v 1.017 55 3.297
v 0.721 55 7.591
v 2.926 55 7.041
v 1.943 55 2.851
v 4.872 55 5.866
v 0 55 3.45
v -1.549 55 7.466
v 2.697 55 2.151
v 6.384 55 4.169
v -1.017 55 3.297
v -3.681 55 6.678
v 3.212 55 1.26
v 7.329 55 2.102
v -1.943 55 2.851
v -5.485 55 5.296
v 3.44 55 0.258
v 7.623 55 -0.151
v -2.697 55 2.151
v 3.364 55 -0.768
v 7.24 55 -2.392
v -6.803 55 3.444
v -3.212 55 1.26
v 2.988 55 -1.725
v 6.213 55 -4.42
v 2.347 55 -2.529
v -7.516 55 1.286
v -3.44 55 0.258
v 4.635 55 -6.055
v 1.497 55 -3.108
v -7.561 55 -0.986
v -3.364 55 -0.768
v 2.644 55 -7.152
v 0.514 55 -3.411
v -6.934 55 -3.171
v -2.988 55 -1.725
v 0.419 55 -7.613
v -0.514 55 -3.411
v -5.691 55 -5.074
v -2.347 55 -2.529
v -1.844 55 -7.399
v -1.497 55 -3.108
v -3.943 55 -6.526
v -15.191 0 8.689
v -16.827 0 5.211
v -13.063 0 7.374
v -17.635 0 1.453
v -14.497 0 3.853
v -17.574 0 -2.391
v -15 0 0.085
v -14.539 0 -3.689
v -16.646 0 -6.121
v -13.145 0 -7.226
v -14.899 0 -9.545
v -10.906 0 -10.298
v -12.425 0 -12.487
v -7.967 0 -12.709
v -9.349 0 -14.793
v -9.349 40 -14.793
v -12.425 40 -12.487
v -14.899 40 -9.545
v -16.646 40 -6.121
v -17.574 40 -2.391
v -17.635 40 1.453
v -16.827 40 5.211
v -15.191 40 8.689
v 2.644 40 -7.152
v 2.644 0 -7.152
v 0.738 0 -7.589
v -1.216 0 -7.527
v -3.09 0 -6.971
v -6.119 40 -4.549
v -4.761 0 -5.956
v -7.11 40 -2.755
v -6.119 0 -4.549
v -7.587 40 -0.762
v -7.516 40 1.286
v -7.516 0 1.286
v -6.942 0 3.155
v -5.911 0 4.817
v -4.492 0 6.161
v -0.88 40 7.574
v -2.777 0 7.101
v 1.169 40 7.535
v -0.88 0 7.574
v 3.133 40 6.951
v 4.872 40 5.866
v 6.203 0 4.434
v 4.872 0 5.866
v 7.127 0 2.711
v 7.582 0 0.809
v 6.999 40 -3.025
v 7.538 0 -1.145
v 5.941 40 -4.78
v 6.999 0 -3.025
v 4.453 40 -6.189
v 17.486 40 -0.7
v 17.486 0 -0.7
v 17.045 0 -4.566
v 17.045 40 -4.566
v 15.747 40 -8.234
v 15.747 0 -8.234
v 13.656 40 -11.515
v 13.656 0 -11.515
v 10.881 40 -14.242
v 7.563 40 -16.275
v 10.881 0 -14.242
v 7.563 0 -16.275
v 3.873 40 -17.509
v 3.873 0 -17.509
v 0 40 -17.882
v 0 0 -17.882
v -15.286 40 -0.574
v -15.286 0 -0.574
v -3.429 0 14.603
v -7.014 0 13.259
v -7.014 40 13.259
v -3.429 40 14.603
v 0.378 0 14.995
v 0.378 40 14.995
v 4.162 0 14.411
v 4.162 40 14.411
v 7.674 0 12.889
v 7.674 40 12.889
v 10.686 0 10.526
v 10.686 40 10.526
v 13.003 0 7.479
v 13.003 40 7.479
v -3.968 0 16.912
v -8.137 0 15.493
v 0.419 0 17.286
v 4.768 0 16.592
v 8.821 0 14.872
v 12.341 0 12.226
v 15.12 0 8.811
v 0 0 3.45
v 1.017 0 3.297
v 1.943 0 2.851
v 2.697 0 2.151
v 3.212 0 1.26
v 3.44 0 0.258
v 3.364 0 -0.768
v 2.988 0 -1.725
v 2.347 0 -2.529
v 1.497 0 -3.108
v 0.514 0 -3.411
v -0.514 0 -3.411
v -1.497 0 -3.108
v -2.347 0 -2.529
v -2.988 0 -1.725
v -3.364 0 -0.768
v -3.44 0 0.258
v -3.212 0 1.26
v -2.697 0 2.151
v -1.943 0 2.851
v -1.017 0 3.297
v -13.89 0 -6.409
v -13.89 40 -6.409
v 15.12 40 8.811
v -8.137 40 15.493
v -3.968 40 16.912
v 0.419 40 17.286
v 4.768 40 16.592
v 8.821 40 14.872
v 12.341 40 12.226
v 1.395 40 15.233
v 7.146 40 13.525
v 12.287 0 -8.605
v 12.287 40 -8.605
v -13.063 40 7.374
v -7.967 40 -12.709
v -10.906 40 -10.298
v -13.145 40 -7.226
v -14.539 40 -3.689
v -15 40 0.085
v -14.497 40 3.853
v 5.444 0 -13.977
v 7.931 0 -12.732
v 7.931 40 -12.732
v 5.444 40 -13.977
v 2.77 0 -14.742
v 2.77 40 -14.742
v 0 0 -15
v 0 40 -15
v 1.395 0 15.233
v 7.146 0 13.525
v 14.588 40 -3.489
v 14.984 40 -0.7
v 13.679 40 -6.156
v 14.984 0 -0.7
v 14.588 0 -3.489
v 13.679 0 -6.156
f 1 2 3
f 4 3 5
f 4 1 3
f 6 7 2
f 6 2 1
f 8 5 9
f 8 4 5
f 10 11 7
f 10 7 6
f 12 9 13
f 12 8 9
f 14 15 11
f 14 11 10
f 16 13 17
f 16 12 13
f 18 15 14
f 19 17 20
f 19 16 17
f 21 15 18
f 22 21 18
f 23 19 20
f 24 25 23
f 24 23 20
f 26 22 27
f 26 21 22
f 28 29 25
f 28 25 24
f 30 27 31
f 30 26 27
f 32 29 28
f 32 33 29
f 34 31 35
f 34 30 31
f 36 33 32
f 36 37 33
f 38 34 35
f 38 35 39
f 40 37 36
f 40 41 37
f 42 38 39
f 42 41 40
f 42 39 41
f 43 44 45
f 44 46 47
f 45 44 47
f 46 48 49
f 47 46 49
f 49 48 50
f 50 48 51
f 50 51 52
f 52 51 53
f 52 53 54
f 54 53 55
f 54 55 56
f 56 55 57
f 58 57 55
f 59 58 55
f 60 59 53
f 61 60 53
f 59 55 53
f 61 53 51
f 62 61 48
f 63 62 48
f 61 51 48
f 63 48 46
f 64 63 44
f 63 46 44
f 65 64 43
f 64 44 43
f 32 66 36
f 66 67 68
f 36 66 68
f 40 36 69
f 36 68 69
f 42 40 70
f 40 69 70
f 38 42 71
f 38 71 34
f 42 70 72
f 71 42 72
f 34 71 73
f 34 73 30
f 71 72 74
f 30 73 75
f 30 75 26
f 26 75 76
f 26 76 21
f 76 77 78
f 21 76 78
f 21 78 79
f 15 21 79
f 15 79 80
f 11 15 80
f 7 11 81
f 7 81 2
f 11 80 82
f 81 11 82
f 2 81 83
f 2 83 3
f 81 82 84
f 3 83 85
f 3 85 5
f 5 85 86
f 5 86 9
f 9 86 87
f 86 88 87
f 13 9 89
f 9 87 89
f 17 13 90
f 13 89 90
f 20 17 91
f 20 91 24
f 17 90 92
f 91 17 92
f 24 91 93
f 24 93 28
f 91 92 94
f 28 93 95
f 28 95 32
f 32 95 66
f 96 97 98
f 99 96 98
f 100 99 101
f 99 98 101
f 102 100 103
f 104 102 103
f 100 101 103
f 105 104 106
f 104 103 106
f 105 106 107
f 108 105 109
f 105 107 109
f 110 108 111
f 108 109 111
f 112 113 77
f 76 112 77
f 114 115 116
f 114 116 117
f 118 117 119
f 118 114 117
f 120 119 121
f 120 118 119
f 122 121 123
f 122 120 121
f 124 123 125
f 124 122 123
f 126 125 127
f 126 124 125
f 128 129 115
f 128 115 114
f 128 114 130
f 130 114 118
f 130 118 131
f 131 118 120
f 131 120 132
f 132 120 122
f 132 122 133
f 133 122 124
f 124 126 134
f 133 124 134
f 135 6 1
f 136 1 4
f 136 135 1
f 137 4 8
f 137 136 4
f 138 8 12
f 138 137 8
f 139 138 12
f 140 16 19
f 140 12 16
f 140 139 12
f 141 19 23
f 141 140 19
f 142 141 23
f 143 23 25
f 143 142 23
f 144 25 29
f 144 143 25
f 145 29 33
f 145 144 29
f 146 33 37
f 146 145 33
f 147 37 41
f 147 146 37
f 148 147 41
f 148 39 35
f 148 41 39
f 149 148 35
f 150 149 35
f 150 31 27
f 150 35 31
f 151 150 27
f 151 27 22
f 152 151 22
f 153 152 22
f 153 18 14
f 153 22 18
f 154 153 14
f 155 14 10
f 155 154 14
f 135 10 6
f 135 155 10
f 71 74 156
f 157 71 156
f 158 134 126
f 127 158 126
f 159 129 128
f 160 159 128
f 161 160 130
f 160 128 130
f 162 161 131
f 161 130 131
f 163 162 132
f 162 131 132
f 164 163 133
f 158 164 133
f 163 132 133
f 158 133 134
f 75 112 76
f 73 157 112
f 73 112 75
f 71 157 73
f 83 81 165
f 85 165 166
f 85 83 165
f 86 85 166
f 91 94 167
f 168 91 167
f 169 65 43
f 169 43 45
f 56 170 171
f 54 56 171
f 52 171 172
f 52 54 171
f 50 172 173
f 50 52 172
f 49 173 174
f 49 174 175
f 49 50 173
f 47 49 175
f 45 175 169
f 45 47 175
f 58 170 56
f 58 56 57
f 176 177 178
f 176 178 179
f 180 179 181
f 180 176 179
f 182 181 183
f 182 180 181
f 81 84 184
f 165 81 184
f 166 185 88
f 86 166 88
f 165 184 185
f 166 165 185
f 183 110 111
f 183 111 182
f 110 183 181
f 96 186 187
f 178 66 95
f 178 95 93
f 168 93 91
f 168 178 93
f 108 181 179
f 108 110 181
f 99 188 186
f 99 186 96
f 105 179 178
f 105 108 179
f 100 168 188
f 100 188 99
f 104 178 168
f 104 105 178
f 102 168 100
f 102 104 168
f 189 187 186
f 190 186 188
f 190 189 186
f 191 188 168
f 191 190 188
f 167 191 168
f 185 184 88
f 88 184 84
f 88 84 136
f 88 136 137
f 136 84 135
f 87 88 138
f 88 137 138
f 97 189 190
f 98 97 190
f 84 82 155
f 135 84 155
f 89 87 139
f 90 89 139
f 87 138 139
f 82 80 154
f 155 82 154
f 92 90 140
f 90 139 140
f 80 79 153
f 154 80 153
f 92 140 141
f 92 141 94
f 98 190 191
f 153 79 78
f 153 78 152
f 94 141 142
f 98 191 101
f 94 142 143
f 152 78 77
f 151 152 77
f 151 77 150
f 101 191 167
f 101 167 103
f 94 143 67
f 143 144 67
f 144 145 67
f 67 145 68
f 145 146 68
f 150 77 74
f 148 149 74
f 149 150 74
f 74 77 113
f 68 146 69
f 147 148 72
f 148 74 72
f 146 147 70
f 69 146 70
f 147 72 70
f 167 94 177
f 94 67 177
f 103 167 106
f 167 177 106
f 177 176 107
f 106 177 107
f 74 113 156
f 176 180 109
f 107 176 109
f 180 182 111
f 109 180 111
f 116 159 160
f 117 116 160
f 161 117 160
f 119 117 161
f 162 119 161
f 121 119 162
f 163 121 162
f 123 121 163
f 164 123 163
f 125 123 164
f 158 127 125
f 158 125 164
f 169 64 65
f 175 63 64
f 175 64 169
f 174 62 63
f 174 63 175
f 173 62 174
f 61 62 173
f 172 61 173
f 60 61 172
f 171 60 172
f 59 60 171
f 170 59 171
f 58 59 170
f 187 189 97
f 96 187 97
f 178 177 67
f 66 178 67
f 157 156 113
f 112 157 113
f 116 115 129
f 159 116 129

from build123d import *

# Parameters (mm, degrees)
BOSS_EXTRUDE6_DEPTH   = 40
BOSS_EXTRUDE6_2_DEPTH = 40
BOSS_EXTRUDE6_3_DEPTH = 40
SKETCH12_R            = 15
CUT_EXTRUDE9_DEPTH    = 40
BOSS_EXTRUDE8_DEPTH   = 40
SKETCH18_R            = 7.625
BOSS_EXTRUDE9_DEPTH   = 55
SKETCH22_R            = 3.45
CUT_EXTRUDE13_DEPTH   = 61.487275479


with BuildPart() as part:
    # Sketch11 → Boss-Extrude6 (new body)
    with BuildSketch(Plane(origin=(0, 0, 0), x_dir=(1, 0, 0), z_dir=(0, 1, 0))):
        with BuildLine():
            ThreePointArc((-9.349413612, 14.793189822), (-17.216152438, 4.282475359), (-15.190534929, -8.688938287))
            Line((-15.190534929, -8.688938287), (0, 0.700234787))
            Line((0, 0.700234787), (-9.349413612, 14.793189822))
        make_face()
    extrude(amount=BOSS_EXTRUDE6_DEPTH)


with BuildPart() as body_2:
    # Sketch11 → Boss-Extrude6 2 (new body)
    with BuildSketch(Plane(origin=(0, 0, 0), x_dir=(1, 0, 0), z_dir=(0, 1, 0))):
        with BuildLine():
            Line((0, 17.881636961), (0, 0.700234787))
            Line((0, 0.700234787), (17.485984995, 0.700234787))
            ThreePointArc((17.485984995, 0.700234787), (12.345670366, 12.957480113), (0, 17.881636961))
        make_face()
    extrude(amount=BOSS_EXTRUDE6_2_DEPTH)


with BuildPart() as body_3:
    # Sketch11 → Boss-Extrude6 3 (new body)
    with BuildSketch(Plane(origin=(0, 0, 0), x_dir=(1, 0, 0), z_dir=(0, 1, 0))):
        with BuildLine():
            Line((15.120108753, -8.810920002), (0, 0.700234787))
            Line((0, 0.700234787), (-8.136571383, -15.49342461))
            ThreePointArc((-8.136571383, -15.49342461), (4.767573461, -16.592271542), (15.120108753, -8.810920002))
        make_face()
    extrude(amount=BOSS_EXTRUDE6_3_DEPTH)


with BuildPart() as cut_extrude9_tool:
    # Sketch12 → Cut-Extrude9 (new body)
    with BuildSketch(Plane(origin=(0, 0, 0), x_dir=(1, 0, 0), z_dir=(0, 1, 0))):
        Circle(SKETCH12_R)
    extrude(amount=CUT_EXTRUDE9_DEPTH)


with BuildPart() as part_1:
    add(part.part)

    # Cut-Extrude9: cut by cut_extrude9_tool
    add(cut_extrude9_tool.part, mode=Mode.SUBTRACT)


with BuildPart() as body_2_1:
    add(body_2.part)

    # Cut-Extrude9: cut by cut_extrude9_tool
    add(cut_extrude9_tool.part, mode=Mode.SUBTRACT)



with BuildPart() as body_3_1:
    add(body_3.part)

    # Cut-Extrude9: cut by cut_extrude9_tool
    add(cut_extrude9_tool.part, mode=Mode.SUBTRACT)


with BuildPart() as body_4:
    # Sketch17 → Boss-Extrude8 (new body)
    with BuildSketch(Plane(origin=(0, 0, 0), x_dir=(1, 0, 0), z_dir=(0, 1, 0))):
        Polygon((-15.286299289, 0.573632321), (-2.382731506, -2.514476202), (1.394671955, -15.233347962), (7.146369483, -13.525139675), (3.368966021, -0.806267914), (12.495130342, 8.824495324), (8.139929807, 12.951507354), (-0.986234515, 3.320744116), (-13.889802298, 6.408852638), align=None)
    extrude(amount=BOSS_EXTRUDE8_DEPTH)


with BuildPart() as body_2_2:
    add(body_2_1.part)

    add(body_4.part)  # Boss-Extrude9 merges body 4
    # Sketch18 → Boss-Extrude9 (add)
    with BuildSketch(Plane(origin=(0, 0, 0), x_dir=(1, 0, 0), z_dir=(0, 1, 0))):
        with Locations(Location((0, 0, 0), (0, 0, 69.709879326))):
            Circle(SKETCH18_R)
    extrude(amount=BOSS_EXTRUDE9_DEPTH)

    # Sketch22 → Cut-Extrude13 (cut, through all)
    with BuildSketch(Plane(origin=(0, 0, 0), x_dir=(1, 0, 0), z_dir=(0, 1, 0))):
        with Locations(Location((0, 0, 0), (0, 0, 270))):
            Circle(SKETCH22_R)
    extrude(amount=CUT_EXTRUDE13_DEPTH, mode=Mode.SUBTRACT)


solid = Compound([part_1.part, body_3_1.part, body_2_2.part])
